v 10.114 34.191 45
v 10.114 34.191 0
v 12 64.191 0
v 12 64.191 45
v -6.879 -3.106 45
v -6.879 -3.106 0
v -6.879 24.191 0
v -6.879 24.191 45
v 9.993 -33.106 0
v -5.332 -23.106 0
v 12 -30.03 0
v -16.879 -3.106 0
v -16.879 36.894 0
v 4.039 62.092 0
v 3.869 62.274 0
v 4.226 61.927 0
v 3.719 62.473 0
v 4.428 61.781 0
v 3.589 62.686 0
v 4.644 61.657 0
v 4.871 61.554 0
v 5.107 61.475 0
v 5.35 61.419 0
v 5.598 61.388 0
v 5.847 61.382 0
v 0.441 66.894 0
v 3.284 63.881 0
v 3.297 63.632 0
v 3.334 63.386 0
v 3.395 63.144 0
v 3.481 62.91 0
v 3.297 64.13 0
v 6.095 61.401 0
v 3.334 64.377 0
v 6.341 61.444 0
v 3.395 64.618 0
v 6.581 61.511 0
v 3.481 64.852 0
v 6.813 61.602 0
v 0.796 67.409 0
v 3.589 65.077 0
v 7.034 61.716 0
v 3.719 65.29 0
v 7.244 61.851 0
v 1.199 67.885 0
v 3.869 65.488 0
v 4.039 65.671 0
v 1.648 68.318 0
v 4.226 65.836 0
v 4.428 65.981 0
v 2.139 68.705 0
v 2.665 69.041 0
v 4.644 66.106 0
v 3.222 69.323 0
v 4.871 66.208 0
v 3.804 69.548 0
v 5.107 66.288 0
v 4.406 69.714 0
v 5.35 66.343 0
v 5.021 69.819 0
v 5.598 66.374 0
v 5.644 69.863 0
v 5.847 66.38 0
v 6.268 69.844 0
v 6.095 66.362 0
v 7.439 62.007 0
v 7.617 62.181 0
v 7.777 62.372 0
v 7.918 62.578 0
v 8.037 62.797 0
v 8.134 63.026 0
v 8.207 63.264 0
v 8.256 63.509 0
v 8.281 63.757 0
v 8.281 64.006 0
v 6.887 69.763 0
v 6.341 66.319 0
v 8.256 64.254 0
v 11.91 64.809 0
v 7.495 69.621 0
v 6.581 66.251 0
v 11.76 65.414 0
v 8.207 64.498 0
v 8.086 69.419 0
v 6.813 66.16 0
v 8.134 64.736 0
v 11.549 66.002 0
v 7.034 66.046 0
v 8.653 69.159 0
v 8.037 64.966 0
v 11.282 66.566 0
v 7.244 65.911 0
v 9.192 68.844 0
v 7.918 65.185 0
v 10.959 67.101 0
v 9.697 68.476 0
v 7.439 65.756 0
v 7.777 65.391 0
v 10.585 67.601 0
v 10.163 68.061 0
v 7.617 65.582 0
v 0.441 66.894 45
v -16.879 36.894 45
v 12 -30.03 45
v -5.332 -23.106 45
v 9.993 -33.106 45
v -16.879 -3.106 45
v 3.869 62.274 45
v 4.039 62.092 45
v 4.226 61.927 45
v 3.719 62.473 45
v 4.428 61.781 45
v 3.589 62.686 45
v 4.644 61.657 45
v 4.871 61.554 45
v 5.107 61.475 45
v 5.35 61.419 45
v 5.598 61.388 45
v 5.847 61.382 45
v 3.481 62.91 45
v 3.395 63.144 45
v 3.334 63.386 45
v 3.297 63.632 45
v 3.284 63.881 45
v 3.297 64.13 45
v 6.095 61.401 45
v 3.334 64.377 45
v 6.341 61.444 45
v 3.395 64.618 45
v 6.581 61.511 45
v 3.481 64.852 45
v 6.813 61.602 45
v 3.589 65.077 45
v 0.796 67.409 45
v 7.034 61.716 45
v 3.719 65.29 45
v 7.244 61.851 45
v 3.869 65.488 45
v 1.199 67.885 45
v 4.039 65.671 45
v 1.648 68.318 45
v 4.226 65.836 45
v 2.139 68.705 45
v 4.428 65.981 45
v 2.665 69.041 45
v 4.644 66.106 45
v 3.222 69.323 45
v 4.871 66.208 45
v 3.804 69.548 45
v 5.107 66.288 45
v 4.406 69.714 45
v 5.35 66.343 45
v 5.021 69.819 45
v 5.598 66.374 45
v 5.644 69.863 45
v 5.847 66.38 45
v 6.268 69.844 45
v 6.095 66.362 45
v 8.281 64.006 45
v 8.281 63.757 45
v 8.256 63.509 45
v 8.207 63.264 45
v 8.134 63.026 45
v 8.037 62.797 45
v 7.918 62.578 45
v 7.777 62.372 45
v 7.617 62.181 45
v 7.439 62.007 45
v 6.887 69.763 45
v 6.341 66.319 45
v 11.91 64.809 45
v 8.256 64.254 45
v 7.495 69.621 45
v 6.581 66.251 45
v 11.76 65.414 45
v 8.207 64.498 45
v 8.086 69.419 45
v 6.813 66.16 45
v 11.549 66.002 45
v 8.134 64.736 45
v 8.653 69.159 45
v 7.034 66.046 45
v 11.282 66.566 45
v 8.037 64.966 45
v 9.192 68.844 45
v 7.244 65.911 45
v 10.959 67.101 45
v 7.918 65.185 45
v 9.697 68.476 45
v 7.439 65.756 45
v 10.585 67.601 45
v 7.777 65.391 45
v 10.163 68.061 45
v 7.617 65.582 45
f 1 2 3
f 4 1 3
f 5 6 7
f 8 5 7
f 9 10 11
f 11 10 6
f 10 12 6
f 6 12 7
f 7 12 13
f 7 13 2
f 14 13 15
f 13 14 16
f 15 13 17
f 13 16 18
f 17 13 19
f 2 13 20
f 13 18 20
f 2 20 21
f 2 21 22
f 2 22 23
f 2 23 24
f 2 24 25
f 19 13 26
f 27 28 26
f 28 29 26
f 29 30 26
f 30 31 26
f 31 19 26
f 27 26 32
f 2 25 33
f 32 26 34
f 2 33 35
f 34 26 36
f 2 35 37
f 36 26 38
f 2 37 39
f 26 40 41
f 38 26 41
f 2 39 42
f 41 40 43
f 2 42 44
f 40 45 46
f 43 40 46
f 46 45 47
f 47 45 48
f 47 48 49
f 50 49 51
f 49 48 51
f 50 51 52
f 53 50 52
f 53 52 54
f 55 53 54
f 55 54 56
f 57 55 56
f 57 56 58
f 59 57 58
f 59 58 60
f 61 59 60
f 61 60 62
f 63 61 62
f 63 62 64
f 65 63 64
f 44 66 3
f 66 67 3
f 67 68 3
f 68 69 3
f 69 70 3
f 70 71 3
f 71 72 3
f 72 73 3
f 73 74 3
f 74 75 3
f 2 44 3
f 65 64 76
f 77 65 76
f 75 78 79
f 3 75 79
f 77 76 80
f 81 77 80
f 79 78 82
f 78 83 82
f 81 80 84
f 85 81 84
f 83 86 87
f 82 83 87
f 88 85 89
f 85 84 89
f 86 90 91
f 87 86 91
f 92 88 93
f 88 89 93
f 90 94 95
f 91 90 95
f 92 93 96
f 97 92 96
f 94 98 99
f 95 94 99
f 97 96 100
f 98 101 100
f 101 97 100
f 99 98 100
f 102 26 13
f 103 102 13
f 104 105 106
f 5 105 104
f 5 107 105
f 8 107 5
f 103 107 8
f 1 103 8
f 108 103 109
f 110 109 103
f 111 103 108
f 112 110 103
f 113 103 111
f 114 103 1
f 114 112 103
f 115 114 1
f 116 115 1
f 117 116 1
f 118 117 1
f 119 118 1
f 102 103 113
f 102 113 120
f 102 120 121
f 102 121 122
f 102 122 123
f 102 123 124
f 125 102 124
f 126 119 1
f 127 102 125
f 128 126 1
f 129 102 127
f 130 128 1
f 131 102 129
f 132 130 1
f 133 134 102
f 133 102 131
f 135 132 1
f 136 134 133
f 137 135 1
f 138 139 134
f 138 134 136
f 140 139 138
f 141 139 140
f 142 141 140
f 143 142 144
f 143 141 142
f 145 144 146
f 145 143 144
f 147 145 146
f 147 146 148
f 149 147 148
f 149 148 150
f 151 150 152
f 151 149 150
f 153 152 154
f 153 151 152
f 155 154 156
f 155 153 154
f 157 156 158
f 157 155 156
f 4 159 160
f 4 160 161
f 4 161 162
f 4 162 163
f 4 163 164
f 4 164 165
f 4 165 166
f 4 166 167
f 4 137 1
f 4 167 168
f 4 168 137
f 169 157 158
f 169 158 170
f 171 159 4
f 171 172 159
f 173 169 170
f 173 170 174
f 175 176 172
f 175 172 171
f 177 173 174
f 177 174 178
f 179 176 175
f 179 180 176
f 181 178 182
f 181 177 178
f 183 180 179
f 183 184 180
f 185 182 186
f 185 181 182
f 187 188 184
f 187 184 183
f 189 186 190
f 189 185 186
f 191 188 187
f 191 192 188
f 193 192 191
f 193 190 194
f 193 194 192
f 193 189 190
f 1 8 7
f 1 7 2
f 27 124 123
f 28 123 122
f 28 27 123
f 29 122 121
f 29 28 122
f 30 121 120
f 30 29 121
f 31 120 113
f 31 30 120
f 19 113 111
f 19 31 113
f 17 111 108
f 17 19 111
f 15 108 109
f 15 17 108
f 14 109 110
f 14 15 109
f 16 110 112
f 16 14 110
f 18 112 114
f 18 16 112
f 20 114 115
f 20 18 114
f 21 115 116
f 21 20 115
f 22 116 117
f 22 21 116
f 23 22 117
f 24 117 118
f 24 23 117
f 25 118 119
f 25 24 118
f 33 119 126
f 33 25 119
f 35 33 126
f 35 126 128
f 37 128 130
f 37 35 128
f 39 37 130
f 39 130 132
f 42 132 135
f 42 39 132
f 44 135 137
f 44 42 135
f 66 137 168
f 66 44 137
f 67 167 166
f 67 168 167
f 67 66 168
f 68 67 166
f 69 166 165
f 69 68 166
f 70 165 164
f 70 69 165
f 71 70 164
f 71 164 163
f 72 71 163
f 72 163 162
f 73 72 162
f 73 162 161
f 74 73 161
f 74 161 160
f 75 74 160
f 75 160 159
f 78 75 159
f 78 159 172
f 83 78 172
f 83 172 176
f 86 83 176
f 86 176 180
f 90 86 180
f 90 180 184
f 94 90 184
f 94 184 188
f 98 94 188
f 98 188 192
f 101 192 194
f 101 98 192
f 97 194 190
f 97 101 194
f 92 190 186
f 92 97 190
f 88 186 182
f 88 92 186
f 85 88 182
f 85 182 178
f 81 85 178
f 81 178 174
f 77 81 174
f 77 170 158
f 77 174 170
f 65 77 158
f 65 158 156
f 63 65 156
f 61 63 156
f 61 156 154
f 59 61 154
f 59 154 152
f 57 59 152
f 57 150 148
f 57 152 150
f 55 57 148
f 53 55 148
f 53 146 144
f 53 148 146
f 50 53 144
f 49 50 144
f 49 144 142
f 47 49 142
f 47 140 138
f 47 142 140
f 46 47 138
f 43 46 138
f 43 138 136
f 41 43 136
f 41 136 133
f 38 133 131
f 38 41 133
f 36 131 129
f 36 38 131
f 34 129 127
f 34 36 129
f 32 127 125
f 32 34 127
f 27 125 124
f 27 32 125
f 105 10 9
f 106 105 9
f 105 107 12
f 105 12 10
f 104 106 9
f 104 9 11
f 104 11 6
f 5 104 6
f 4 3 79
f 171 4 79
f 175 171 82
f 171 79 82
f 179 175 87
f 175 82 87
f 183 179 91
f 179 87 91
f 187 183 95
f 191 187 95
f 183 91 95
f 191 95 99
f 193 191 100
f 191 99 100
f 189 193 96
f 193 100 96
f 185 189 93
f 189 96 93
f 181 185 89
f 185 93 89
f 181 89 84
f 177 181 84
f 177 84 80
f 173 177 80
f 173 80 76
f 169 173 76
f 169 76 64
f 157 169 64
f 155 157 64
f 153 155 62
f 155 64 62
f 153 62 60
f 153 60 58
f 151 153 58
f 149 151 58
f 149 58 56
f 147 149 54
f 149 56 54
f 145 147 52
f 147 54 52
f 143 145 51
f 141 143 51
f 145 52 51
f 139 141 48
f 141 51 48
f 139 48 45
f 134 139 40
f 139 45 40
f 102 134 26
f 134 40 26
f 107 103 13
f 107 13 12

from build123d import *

# Parameters (mm, degrees)
EXTRUDE_4_DEPTH     = 45
SKETCH_2_R          = 2.5
CUT_EXTRUDE_1_DEPTH = 85.798913103


with BuildPart() as part:
    # 草图1 → 凸台-拉伸4 (new body)
    with BuildSketch(Plane.XY):
        with BuildLine():
            ThreePointArc((11.999755772, 64.190702015), (7.19287537, 69.699227744), (0.441332655, 66.894477154))
            Line((0.441332655, 66.894477154), (-16.87917542, 36.894477154))
            Line((-16.87917542, 36.894477154), (-16.87917542, -3.105522846))
            Line((-16.87917542, -3.105522846), (-5.332170037, -23.105522846))
            Line((-5.332170037, -23.105522846), (9.992741519, -33.105522846))
            Line((9.992741519, -33.105522846), (11.999755772, -30.029791253))
            Line((11.999755772, -30.029791253), (-6.87917542, -3.105522846))
            Line((-6.87917542, -3.105522846), (-6.87917542, 14.190702015))
            Line((-6.87917542, 14.190702015), (-6.87917542, 24.190702015))
            Line((-6.87917542, 24.190702015), (10.114332844, 34.190702015))
            Line((10.114332844, 34.190702015), (11.999755772, 64.190702015))
        make_face()
    extrude(amount=EXTRUDE_4_DEPTH)

    # 草图2 → 切除-拉伸1 (cut, through all)
    with BuildSketch(Plane.XY):
        with Locations(Location((5.784422652, 63.881230161, 0), (0, 0, 180))):
            Circle(SKETCH_2_R)
    extrude(amount=CUT_EXTRUDE_1_DEPTH, mode=Mode.SUBTRACT)


solid = part.part
